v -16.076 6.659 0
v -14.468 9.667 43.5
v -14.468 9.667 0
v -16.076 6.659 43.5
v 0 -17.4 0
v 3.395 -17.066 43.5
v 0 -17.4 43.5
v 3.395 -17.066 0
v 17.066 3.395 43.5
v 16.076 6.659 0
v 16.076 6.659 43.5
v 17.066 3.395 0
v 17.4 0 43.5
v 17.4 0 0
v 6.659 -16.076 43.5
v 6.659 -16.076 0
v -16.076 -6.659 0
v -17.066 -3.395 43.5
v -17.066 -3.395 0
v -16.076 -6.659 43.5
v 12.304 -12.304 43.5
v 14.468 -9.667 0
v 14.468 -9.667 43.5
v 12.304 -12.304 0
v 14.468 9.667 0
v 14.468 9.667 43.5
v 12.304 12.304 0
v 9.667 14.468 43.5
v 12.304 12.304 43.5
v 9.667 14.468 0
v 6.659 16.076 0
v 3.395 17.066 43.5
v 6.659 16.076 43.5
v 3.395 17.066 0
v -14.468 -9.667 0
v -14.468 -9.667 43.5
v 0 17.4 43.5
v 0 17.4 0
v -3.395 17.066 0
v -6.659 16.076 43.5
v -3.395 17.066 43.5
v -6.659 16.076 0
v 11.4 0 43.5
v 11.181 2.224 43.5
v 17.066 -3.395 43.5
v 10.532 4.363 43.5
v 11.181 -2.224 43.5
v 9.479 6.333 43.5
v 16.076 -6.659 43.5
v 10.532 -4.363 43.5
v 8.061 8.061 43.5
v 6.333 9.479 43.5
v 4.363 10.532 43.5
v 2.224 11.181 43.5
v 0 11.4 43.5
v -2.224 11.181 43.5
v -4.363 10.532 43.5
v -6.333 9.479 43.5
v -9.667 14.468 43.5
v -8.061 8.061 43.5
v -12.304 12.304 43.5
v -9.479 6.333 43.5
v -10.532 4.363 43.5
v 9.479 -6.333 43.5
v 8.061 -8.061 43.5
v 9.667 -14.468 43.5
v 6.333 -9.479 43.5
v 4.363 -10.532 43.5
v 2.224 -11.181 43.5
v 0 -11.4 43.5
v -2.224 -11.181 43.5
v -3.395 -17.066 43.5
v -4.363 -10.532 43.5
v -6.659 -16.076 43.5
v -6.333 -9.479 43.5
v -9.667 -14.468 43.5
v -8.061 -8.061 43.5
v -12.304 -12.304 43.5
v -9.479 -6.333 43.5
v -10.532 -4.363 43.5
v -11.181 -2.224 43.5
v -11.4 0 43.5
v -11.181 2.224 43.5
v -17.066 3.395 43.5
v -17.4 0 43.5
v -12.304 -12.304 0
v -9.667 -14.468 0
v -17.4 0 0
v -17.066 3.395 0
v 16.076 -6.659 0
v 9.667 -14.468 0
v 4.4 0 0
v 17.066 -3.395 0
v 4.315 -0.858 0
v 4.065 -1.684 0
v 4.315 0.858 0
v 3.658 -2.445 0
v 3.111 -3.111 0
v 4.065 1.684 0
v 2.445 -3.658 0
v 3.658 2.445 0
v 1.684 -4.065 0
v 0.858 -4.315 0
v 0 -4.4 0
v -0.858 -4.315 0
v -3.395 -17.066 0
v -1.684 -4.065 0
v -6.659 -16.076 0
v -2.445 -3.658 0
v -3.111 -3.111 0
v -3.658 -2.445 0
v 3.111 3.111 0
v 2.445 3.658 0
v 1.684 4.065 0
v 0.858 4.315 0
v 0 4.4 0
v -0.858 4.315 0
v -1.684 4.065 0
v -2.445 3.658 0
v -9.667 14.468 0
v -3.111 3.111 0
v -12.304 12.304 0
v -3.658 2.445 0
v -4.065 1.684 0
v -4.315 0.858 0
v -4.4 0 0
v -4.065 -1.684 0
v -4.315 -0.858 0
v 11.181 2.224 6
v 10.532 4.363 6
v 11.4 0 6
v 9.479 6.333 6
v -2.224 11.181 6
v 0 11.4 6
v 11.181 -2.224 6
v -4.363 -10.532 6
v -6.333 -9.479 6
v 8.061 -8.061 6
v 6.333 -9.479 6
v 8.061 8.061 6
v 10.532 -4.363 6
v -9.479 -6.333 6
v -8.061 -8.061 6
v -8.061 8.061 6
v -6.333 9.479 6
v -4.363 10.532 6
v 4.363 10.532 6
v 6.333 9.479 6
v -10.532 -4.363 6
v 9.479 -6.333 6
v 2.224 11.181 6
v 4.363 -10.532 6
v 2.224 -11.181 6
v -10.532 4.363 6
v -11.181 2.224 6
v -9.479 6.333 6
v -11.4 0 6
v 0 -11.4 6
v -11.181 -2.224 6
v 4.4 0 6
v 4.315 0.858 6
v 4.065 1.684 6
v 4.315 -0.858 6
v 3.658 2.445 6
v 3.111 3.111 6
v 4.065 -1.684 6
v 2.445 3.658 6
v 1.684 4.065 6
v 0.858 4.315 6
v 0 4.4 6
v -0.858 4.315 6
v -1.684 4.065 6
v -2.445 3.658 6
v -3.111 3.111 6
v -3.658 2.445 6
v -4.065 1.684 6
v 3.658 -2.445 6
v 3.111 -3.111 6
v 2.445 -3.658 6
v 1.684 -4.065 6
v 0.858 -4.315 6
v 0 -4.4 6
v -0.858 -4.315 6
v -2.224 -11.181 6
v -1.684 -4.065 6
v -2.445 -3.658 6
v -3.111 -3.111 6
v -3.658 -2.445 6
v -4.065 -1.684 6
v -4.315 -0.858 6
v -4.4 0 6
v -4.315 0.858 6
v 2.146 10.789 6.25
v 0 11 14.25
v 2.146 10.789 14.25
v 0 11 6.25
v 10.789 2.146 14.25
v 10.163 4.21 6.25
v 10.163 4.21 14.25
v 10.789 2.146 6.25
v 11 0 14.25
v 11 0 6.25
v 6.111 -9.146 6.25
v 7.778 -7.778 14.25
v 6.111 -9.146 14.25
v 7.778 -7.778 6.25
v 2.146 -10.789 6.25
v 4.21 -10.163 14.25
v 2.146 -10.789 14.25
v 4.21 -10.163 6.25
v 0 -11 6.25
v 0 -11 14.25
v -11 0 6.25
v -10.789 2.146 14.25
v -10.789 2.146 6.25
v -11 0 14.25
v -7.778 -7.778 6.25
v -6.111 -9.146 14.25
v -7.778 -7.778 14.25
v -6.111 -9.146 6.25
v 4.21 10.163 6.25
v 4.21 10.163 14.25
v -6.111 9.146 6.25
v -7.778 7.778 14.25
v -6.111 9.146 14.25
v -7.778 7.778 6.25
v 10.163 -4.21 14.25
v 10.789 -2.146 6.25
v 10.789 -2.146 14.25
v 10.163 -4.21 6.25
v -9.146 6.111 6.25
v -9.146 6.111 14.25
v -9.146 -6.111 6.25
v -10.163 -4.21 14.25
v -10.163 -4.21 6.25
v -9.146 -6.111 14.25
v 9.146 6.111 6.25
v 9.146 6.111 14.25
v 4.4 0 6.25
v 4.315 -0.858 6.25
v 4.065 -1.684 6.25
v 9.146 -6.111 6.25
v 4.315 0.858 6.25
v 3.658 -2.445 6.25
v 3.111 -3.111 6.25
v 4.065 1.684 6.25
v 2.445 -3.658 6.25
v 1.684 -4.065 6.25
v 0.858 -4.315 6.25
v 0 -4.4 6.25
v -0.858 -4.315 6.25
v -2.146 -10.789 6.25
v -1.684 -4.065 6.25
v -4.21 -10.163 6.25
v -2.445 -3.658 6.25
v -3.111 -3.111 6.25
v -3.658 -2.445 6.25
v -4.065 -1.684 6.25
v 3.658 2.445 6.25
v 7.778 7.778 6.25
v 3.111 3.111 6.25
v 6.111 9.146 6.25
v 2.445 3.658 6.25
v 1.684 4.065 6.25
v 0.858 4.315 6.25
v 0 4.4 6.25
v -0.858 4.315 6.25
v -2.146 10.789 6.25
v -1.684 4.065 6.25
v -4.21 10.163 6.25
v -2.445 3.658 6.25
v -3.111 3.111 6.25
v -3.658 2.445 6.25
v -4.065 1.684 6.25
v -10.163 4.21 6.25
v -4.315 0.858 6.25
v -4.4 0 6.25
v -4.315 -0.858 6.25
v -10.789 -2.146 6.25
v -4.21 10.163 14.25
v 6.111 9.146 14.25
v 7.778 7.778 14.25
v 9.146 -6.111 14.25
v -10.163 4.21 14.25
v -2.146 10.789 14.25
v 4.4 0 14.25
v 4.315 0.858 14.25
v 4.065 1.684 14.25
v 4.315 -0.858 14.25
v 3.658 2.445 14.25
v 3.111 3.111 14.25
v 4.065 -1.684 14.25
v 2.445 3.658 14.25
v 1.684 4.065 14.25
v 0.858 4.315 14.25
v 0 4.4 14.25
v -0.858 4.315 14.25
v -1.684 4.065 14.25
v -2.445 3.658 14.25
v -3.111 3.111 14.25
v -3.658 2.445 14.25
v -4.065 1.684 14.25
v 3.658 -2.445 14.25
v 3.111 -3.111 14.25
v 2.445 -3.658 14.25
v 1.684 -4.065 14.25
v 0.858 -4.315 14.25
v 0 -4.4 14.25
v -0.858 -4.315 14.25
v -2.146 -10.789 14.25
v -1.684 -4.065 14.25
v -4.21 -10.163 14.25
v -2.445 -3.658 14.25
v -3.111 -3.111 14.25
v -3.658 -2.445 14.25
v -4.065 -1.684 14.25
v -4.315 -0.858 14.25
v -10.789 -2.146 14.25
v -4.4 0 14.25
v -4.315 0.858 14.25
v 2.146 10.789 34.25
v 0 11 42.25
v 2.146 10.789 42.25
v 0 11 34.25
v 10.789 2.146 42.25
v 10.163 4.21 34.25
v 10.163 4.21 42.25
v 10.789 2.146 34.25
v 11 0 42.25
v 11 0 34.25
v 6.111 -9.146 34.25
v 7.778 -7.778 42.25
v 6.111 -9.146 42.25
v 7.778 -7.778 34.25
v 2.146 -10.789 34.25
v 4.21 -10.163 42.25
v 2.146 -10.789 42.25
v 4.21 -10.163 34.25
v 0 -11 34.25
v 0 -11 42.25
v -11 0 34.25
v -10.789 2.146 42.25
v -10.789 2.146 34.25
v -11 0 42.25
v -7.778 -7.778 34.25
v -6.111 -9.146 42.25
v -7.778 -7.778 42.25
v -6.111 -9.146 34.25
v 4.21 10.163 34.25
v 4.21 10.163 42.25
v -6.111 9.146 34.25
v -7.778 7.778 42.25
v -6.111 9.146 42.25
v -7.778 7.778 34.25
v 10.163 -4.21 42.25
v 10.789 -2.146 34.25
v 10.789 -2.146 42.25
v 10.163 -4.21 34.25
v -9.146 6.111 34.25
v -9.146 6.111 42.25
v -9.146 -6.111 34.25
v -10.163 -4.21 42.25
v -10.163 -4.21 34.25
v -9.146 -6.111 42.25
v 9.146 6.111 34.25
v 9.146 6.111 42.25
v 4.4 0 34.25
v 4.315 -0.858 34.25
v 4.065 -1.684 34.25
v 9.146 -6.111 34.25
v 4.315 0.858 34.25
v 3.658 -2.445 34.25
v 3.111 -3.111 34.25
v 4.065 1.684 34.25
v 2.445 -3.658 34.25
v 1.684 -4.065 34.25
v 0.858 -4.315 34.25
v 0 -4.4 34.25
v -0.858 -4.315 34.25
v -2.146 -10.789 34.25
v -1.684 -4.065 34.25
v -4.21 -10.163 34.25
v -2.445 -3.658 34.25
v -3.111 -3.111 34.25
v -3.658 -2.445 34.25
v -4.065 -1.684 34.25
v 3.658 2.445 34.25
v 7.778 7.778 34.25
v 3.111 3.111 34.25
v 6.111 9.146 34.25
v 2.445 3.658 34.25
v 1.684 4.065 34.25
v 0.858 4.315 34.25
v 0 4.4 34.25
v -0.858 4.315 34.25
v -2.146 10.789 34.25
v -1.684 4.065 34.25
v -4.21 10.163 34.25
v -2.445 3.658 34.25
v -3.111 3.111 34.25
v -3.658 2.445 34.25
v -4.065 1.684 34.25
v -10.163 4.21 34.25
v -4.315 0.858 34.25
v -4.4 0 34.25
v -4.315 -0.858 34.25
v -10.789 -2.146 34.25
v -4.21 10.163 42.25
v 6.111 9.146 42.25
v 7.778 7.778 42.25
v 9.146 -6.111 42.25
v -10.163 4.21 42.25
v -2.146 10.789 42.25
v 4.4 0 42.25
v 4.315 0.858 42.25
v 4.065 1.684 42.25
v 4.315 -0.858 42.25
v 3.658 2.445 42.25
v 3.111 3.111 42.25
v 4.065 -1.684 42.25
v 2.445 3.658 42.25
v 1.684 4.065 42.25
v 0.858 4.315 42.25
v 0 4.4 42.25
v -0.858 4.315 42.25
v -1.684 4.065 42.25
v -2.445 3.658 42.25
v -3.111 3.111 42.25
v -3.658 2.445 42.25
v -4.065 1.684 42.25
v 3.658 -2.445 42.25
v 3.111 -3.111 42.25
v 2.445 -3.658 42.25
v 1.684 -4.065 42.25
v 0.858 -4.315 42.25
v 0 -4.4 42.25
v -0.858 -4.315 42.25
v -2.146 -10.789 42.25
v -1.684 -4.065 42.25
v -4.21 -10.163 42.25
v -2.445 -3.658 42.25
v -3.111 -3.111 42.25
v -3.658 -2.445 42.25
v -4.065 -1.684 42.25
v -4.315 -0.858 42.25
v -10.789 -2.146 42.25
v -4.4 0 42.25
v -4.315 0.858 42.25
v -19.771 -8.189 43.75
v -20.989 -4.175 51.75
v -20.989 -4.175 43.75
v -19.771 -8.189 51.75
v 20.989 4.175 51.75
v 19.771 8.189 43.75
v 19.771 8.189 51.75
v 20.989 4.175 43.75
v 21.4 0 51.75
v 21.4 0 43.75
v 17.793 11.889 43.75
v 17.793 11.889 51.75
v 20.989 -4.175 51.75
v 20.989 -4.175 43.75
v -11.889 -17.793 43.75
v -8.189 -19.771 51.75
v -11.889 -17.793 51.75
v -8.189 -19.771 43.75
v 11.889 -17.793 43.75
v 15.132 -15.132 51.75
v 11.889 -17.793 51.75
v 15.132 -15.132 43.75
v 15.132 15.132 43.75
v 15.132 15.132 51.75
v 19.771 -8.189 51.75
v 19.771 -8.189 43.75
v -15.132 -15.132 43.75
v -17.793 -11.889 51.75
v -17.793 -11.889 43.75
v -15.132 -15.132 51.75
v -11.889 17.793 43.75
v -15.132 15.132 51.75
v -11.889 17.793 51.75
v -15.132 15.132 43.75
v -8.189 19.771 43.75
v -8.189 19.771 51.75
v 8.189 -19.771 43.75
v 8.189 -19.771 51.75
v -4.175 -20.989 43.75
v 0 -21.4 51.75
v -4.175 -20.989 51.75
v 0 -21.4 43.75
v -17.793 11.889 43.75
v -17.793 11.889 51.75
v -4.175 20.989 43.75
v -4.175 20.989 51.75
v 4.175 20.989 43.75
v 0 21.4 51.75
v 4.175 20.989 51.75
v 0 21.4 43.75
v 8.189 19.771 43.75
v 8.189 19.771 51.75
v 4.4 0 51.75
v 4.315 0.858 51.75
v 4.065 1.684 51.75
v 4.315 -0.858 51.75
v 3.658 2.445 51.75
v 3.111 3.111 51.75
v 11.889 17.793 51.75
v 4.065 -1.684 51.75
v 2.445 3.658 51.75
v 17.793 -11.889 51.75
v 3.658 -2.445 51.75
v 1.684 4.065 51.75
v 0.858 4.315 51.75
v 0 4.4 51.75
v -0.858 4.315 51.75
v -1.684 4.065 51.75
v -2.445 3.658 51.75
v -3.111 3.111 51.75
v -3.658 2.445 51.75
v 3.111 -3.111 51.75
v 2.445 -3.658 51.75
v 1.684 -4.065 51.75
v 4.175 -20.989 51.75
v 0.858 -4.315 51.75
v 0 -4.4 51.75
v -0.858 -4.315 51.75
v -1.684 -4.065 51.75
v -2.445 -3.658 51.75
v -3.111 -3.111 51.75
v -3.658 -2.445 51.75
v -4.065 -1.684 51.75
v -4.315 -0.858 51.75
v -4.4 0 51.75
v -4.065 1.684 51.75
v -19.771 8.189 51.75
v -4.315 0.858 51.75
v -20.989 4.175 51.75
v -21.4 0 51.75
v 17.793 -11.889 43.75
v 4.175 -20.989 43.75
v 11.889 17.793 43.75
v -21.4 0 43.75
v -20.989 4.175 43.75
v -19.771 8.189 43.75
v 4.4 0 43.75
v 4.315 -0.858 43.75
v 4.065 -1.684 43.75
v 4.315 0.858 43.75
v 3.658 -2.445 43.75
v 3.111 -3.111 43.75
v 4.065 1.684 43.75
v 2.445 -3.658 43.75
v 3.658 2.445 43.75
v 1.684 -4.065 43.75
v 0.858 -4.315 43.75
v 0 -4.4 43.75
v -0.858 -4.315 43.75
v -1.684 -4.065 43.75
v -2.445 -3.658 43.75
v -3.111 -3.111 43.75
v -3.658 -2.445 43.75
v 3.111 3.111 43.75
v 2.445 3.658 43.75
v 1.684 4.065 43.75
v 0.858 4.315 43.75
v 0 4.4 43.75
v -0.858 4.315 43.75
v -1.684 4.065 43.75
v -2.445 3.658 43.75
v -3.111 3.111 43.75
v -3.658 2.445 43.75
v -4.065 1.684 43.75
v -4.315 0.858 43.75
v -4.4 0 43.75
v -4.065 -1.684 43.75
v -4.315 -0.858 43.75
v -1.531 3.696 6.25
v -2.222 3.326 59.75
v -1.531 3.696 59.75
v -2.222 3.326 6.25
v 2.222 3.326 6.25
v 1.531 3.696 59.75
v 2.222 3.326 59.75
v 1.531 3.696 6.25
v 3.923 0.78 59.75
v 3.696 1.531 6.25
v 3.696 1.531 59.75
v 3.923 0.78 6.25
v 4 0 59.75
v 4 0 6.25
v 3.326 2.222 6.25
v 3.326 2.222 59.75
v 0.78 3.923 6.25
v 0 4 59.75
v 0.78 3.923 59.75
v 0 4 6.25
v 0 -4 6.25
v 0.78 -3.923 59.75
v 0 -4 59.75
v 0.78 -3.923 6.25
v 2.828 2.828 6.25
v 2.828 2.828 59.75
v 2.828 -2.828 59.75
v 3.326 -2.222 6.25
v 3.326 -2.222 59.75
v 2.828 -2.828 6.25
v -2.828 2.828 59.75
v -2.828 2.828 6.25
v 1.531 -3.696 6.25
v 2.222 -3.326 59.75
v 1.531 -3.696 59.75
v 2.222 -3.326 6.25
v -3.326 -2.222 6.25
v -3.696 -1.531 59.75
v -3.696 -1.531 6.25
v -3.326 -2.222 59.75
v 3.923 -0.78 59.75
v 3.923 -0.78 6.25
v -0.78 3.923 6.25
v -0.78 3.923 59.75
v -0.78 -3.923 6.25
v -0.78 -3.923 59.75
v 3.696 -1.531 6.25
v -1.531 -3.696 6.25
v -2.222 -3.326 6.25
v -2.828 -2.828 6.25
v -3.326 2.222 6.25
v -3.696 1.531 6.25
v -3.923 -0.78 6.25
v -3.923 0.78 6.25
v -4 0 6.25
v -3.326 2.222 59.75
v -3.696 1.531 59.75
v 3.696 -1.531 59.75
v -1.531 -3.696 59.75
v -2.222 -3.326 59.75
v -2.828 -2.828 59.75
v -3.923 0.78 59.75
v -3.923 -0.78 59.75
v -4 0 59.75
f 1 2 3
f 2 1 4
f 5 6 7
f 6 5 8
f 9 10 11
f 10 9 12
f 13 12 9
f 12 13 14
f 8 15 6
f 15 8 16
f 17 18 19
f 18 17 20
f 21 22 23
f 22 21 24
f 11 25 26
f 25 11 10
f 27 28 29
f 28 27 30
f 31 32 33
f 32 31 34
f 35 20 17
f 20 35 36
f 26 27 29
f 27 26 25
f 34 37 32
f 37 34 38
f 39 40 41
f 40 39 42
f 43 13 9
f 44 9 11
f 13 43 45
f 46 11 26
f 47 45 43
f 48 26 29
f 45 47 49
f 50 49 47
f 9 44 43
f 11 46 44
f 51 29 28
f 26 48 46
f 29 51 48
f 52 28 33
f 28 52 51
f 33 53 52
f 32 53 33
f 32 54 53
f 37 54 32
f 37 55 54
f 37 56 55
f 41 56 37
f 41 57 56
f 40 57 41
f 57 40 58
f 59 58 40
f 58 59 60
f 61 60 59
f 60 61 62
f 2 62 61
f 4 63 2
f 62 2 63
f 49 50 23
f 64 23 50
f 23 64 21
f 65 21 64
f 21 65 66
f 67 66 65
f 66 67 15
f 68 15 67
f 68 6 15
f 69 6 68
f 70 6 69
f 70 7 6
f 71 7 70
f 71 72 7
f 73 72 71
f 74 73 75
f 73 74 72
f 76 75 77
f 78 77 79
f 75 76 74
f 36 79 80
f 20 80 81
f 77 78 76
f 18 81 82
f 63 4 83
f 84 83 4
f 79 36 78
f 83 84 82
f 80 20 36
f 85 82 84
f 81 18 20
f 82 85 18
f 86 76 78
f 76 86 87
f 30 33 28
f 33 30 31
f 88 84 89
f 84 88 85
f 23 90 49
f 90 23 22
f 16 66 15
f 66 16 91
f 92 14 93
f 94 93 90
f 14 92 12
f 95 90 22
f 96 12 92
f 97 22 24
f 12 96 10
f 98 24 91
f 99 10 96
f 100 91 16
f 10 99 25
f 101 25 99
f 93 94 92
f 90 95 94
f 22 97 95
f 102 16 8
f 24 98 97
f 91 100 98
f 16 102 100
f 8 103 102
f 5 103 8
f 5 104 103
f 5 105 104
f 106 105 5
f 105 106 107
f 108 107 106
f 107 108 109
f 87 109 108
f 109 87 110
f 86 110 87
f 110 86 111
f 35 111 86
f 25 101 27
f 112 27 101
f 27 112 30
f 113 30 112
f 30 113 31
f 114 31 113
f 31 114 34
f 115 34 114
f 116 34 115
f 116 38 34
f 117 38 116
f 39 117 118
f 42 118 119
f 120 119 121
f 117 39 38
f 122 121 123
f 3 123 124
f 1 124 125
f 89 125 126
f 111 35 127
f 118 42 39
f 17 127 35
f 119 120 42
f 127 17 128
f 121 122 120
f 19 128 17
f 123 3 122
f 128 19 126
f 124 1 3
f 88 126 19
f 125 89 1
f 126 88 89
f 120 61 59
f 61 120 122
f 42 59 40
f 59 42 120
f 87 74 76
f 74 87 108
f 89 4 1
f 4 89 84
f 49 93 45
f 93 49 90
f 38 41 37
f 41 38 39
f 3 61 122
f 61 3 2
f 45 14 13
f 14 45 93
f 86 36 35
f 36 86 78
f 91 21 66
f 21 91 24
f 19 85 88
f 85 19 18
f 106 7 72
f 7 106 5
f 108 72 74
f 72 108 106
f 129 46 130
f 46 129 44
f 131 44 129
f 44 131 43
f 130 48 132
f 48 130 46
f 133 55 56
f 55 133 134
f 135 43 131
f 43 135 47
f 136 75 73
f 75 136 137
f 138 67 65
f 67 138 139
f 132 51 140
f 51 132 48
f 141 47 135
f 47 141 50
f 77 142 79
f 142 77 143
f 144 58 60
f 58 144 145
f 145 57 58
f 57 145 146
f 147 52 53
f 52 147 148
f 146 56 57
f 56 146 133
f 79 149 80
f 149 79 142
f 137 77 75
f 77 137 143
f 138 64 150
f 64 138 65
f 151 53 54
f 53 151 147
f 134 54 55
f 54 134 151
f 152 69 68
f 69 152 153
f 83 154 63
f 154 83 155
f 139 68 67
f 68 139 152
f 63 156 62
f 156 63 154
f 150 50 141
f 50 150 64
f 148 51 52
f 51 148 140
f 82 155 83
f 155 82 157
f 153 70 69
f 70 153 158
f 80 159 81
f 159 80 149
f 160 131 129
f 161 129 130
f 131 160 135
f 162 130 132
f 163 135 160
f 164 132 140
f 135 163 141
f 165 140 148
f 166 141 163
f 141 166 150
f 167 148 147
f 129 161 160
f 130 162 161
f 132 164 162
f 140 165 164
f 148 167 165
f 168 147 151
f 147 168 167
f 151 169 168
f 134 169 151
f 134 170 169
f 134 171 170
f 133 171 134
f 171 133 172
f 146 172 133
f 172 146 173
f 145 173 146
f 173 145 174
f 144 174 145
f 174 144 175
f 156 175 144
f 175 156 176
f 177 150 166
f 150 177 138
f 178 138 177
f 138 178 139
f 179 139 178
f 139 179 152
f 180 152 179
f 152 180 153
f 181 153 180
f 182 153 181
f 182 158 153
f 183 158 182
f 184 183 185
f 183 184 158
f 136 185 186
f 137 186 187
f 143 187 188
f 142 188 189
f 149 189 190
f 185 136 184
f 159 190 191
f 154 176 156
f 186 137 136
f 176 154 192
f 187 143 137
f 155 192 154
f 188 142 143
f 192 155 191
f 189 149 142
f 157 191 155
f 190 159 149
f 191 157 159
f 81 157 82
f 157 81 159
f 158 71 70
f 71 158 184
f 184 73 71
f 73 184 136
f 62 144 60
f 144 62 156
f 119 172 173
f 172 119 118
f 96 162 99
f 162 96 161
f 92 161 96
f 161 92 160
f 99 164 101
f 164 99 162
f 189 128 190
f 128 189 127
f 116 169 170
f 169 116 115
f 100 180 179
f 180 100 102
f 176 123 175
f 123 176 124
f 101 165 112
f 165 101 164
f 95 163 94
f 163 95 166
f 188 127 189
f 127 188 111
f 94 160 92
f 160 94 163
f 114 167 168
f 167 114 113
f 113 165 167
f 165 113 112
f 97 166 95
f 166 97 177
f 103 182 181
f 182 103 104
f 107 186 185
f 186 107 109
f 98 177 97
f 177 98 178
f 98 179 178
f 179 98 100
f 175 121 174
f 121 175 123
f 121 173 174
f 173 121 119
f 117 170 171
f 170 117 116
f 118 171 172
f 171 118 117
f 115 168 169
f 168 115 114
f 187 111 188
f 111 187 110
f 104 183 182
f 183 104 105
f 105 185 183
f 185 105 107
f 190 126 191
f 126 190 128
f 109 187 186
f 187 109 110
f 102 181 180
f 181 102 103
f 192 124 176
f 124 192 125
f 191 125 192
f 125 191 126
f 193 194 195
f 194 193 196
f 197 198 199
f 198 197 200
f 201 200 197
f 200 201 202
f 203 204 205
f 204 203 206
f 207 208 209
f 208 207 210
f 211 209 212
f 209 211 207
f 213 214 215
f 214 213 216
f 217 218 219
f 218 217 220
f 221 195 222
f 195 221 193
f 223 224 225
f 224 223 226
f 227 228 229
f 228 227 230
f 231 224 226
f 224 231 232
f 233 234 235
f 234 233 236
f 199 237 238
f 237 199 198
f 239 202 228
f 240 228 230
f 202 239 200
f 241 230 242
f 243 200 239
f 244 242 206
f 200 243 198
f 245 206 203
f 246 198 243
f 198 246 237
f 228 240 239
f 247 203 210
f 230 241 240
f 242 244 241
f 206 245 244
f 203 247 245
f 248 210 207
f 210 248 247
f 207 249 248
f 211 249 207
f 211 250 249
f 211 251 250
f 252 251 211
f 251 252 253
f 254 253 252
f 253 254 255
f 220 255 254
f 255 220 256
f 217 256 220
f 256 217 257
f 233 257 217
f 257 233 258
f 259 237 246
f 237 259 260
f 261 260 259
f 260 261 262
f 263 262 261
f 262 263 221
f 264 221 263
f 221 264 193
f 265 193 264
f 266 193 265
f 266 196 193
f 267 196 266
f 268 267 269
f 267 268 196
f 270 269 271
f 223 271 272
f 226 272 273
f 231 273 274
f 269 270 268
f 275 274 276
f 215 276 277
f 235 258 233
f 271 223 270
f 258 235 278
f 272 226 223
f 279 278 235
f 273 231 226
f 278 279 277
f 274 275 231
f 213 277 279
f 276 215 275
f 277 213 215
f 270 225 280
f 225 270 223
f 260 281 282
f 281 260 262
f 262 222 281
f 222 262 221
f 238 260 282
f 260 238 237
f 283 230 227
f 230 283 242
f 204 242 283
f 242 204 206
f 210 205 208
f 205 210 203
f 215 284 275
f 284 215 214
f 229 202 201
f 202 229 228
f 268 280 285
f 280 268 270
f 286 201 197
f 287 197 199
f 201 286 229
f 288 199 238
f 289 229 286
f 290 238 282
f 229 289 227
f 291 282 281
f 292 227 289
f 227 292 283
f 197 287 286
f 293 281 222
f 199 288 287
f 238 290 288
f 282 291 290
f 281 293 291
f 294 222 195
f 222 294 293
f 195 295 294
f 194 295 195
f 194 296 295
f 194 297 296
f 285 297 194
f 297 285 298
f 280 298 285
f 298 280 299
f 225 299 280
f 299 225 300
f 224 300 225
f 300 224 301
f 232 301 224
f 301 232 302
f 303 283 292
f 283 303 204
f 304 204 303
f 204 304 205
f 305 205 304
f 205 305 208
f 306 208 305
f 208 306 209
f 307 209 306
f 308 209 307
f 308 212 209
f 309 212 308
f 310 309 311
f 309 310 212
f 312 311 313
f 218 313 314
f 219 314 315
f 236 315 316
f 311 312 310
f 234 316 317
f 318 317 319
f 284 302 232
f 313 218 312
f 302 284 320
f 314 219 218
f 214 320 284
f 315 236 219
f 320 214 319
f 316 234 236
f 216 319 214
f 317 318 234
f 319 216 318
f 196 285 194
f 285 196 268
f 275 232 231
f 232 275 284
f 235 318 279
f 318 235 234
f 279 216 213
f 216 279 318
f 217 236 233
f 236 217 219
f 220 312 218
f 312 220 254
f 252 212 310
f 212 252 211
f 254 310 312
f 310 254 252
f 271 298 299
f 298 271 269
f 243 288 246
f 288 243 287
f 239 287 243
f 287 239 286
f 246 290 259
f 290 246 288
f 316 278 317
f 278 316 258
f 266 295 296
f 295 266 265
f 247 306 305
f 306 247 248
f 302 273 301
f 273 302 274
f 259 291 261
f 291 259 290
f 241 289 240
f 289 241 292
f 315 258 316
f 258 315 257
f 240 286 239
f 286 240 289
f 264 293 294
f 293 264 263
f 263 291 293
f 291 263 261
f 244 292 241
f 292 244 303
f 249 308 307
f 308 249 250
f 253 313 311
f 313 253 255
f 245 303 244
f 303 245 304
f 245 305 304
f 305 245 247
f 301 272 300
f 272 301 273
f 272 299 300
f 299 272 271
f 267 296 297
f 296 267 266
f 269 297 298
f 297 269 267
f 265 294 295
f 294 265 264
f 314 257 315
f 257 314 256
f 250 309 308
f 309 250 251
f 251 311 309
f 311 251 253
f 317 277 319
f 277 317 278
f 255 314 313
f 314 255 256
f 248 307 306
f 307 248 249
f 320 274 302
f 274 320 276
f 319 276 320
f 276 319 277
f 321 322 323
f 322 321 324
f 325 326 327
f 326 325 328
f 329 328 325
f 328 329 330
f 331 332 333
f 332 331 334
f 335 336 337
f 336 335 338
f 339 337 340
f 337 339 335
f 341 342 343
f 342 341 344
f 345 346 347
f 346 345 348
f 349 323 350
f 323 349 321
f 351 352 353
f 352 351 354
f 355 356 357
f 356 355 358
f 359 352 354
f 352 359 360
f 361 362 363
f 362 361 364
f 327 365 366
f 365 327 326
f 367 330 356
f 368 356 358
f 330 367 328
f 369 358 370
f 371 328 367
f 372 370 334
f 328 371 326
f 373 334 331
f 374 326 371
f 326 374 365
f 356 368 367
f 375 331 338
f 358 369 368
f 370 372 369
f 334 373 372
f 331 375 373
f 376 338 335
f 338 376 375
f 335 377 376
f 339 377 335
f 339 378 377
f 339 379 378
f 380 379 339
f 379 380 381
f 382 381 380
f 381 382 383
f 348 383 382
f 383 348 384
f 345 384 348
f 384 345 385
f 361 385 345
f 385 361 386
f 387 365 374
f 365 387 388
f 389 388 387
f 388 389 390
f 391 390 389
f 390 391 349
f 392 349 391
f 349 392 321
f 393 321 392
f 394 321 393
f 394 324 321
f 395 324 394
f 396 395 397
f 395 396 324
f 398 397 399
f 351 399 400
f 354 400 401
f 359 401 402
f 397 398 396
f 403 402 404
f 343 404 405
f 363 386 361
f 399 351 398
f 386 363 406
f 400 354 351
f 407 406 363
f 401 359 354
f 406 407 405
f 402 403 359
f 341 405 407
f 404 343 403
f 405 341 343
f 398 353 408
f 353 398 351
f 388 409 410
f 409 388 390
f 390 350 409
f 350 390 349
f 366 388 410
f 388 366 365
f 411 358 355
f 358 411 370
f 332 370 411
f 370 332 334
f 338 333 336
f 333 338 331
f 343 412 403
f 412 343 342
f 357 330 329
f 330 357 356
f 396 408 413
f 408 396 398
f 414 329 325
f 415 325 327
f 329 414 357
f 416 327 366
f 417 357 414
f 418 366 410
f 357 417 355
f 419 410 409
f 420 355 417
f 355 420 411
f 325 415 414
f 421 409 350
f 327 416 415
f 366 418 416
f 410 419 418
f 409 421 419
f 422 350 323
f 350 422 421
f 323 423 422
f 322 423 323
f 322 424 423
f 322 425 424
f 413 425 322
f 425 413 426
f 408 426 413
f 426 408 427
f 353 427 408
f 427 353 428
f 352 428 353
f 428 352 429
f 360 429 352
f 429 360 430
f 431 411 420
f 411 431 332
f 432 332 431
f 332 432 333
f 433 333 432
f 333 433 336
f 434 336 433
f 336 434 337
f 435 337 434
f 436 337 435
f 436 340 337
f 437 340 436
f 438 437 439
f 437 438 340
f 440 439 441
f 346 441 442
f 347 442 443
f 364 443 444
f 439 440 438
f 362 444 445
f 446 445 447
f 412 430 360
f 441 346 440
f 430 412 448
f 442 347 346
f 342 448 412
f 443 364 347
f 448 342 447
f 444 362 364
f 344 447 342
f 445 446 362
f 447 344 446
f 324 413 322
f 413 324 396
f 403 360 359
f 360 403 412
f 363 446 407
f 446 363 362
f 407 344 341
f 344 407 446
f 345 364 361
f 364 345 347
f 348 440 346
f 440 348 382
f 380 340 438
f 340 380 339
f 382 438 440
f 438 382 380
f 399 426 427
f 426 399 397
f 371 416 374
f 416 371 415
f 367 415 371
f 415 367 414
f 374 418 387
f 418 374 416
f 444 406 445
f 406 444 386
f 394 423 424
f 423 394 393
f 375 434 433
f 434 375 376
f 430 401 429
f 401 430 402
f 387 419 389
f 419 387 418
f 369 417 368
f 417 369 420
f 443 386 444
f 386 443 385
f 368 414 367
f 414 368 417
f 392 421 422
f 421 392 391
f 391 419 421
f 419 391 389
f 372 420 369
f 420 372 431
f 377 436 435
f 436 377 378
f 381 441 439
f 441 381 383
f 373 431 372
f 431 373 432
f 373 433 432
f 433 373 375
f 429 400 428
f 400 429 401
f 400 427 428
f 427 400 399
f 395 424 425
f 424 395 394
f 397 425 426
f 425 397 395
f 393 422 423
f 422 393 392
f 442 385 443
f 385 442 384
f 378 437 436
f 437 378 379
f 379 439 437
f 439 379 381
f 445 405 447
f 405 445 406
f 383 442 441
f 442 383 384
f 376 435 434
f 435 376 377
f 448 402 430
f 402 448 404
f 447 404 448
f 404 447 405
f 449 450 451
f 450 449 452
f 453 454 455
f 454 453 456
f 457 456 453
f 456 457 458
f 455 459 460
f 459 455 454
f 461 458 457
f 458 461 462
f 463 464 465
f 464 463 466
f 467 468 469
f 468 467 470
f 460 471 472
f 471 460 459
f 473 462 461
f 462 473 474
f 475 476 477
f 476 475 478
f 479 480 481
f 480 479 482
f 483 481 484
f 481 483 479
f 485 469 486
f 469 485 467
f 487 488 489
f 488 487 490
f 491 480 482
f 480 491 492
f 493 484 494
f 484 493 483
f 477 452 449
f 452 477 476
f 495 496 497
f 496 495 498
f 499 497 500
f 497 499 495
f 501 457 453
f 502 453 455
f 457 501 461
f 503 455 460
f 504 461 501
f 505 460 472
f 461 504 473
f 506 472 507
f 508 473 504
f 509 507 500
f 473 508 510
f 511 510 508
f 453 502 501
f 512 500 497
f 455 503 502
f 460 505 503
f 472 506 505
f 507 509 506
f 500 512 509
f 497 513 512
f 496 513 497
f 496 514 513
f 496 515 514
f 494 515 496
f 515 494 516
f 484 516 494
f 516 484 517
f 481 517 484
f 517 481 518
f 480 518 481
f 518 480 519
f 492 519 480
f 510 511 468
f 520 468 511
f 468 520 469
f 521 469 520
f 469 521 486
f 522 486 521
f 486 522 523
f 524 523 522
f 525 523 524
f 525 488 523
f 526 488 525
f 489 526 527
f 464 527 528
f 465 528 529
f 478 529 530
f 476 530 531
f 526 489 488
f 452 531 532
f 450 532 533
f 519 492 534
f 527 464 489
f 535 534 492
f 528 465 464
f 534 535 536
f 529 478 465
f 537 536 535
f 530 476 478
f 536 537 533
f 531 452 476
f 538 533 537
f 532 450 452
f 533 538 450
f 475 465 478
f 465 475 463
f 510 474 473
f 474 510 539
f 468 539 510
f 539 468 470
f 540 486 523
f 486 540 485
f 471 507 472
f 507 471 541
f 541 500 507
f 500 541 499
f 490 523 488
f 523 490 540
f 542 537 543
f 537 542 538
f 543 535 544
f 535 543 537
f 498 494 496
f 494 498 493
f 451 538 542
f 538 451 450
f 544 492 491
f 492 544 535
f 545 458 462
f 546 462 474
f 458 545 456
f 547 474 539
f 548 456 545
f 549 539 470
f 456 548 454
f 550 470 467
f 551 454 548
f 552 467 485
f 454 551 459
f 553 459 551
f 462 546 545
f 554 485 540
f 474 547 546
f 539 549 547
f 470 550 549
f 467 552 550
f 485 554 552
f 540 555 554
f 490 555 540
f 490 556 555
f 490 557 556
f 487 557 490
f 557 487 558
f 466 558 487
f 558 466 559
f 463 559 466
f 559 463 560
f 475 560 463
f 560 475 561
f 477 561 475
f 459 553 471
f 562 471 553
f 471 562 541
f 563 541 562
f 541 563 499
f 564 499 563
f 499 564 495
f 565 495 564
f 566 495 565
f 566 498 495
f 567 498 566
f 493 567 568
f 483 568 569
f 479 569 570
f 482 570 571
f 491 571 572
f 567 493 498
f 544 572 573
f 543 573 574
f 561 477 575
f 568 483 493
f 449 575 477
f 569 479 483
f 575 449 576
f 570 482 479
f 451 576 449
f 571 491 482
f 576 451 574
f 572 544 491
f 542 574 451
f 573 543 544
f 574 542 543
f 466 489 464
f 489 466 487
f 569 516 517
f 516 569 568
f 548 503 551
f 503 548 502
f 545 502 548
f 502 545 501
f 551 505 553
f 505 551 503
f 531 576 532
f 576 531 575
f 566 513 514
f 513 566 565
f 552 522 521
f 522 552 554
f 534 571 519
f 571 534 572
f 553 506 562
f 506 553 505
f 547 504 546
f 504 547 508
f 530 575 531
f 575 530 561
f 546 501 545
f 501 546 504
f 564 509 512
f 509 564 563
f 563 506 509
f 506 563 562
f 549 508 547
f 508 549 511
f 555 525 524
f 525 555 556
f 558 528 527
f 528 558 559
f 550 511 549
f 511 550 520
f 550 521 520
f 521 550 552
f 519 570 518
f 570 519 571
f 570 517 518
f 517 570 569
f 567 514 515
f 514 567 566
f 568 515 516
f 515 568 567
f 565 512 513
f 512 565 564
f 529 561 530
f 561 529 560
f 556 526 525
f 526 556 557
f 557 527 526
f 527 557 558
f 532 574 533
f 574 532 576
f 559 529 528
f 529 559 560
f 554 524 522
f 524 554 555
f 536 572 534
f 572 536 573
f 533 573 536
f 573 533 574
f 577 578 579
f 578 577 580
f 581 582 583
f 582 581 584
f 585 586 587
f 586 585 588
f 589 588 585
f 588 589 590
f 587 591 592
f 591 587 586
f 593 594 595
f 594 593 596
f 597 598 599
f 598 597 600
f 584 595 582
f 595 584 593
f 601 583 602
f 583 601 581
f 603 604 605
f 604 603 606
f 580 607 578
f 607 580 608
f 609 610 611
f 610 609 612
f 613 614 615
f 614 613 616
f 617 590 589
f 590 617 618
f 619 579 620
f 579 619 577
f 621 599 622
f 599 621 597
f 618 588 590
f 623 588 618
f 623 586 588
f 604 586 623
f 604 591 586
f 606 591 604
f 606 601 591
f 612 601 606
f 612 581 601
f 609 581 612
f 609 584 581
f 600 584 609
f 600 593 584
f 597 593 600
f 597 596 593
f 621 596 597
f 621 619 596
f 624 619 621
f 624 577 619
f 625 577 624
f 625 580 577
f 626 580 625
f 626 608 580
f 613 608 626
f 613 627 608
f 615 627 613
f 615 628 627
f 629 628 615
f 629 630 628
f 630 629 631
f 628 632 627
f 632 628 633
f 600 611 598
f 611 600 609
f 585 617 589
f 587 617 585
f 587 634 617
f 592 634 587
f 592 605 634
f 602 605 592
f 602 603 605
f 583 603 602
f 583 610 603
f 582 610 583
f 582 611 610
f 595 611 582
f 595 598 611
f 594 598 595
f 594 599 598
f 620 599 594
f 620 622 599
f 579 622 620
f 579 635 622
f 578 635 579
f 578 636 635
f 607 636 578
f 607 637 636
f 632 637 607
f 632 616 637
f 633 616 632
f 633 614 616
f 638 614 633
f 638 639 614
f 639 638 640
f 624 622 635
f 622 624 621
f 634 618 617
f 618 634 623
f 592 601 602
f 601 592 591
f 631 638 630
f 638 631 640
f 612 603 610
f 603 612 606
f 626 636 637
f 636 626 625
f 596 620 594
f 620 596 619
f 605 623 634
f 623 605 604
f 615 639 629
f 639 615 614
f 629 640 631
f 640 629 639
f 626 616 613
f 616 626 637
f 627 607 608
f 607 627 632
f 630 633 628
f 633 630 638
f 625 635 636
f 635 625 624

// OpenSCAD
$fn = 32;

// ------------------------------------------------------------------------
// Shaft station: cup d34.8 x 43.5 mm, shaft d8
// Every part is its own module, assembly() places every instance.
// ------------------------------------------------------------------------

// --- part 1 ---
module housing_cup() {
  difference() {
    cylinder(h = 43.5, d = 34.8);
    translate([0, 0, 6]) cylinder(h = 38.5, d = 22.8);
    translate([0, 0, -1]) cylinder(h = 8, d = 8.8);
  }
}

// --- part 2 ---
module bearing_lower() {
  difference() {
      translate([0, 0, 0]) cylinder(h = 8, d = 22);
      translate([0, 0, -1]) cylinder(h = 10, d = 8.8);
    }
}

// --- part 3 ---
module bearing_upper() {
  difference() {
      translate([0, 0, 0]) cylinder(h = 8, d = 22);
      translate([0, 0, -1]) cylinder(h = 10, d = 8.8);
    }
}

// --- part 4 ---
module station_shaft() {
  translate([0, 0, -26.75]) cylinder(h = 53.5, d = 8);
}

// --- part 5 ---
module station_cover() {
  difference() {
    cylinder(h = 8, d = 42.8);
    translate([0, 0, -1]) cylinder(h = 10, d = 8.8);
  }
}

// --- assembly ---
module assembly() {
  color([0.80, 0.24, 0.20]) translate([0, 0, 0]) rotate([0, 0, 0]) housing_cup();
  color([0.20, 0.45, 0.75]) translate([0, 0, 6.25]) rotate([0, 0, 0]) bearing_lower();
  color([0.25, 0.62, 0.32]) translate([0, 0, 34.25]) rotate([0, 0, 0]) bearing_upper();
  color([0.92, 0.70, 0.18]) translate([0, 0, 33]) rotate([0, 0, 0]) station_shaft();
  color([0.58, 0.35, 0.70]) translate([0, 0, 43.75]) rotate([0, 0, 0]) station_cover();
}

assembly();
